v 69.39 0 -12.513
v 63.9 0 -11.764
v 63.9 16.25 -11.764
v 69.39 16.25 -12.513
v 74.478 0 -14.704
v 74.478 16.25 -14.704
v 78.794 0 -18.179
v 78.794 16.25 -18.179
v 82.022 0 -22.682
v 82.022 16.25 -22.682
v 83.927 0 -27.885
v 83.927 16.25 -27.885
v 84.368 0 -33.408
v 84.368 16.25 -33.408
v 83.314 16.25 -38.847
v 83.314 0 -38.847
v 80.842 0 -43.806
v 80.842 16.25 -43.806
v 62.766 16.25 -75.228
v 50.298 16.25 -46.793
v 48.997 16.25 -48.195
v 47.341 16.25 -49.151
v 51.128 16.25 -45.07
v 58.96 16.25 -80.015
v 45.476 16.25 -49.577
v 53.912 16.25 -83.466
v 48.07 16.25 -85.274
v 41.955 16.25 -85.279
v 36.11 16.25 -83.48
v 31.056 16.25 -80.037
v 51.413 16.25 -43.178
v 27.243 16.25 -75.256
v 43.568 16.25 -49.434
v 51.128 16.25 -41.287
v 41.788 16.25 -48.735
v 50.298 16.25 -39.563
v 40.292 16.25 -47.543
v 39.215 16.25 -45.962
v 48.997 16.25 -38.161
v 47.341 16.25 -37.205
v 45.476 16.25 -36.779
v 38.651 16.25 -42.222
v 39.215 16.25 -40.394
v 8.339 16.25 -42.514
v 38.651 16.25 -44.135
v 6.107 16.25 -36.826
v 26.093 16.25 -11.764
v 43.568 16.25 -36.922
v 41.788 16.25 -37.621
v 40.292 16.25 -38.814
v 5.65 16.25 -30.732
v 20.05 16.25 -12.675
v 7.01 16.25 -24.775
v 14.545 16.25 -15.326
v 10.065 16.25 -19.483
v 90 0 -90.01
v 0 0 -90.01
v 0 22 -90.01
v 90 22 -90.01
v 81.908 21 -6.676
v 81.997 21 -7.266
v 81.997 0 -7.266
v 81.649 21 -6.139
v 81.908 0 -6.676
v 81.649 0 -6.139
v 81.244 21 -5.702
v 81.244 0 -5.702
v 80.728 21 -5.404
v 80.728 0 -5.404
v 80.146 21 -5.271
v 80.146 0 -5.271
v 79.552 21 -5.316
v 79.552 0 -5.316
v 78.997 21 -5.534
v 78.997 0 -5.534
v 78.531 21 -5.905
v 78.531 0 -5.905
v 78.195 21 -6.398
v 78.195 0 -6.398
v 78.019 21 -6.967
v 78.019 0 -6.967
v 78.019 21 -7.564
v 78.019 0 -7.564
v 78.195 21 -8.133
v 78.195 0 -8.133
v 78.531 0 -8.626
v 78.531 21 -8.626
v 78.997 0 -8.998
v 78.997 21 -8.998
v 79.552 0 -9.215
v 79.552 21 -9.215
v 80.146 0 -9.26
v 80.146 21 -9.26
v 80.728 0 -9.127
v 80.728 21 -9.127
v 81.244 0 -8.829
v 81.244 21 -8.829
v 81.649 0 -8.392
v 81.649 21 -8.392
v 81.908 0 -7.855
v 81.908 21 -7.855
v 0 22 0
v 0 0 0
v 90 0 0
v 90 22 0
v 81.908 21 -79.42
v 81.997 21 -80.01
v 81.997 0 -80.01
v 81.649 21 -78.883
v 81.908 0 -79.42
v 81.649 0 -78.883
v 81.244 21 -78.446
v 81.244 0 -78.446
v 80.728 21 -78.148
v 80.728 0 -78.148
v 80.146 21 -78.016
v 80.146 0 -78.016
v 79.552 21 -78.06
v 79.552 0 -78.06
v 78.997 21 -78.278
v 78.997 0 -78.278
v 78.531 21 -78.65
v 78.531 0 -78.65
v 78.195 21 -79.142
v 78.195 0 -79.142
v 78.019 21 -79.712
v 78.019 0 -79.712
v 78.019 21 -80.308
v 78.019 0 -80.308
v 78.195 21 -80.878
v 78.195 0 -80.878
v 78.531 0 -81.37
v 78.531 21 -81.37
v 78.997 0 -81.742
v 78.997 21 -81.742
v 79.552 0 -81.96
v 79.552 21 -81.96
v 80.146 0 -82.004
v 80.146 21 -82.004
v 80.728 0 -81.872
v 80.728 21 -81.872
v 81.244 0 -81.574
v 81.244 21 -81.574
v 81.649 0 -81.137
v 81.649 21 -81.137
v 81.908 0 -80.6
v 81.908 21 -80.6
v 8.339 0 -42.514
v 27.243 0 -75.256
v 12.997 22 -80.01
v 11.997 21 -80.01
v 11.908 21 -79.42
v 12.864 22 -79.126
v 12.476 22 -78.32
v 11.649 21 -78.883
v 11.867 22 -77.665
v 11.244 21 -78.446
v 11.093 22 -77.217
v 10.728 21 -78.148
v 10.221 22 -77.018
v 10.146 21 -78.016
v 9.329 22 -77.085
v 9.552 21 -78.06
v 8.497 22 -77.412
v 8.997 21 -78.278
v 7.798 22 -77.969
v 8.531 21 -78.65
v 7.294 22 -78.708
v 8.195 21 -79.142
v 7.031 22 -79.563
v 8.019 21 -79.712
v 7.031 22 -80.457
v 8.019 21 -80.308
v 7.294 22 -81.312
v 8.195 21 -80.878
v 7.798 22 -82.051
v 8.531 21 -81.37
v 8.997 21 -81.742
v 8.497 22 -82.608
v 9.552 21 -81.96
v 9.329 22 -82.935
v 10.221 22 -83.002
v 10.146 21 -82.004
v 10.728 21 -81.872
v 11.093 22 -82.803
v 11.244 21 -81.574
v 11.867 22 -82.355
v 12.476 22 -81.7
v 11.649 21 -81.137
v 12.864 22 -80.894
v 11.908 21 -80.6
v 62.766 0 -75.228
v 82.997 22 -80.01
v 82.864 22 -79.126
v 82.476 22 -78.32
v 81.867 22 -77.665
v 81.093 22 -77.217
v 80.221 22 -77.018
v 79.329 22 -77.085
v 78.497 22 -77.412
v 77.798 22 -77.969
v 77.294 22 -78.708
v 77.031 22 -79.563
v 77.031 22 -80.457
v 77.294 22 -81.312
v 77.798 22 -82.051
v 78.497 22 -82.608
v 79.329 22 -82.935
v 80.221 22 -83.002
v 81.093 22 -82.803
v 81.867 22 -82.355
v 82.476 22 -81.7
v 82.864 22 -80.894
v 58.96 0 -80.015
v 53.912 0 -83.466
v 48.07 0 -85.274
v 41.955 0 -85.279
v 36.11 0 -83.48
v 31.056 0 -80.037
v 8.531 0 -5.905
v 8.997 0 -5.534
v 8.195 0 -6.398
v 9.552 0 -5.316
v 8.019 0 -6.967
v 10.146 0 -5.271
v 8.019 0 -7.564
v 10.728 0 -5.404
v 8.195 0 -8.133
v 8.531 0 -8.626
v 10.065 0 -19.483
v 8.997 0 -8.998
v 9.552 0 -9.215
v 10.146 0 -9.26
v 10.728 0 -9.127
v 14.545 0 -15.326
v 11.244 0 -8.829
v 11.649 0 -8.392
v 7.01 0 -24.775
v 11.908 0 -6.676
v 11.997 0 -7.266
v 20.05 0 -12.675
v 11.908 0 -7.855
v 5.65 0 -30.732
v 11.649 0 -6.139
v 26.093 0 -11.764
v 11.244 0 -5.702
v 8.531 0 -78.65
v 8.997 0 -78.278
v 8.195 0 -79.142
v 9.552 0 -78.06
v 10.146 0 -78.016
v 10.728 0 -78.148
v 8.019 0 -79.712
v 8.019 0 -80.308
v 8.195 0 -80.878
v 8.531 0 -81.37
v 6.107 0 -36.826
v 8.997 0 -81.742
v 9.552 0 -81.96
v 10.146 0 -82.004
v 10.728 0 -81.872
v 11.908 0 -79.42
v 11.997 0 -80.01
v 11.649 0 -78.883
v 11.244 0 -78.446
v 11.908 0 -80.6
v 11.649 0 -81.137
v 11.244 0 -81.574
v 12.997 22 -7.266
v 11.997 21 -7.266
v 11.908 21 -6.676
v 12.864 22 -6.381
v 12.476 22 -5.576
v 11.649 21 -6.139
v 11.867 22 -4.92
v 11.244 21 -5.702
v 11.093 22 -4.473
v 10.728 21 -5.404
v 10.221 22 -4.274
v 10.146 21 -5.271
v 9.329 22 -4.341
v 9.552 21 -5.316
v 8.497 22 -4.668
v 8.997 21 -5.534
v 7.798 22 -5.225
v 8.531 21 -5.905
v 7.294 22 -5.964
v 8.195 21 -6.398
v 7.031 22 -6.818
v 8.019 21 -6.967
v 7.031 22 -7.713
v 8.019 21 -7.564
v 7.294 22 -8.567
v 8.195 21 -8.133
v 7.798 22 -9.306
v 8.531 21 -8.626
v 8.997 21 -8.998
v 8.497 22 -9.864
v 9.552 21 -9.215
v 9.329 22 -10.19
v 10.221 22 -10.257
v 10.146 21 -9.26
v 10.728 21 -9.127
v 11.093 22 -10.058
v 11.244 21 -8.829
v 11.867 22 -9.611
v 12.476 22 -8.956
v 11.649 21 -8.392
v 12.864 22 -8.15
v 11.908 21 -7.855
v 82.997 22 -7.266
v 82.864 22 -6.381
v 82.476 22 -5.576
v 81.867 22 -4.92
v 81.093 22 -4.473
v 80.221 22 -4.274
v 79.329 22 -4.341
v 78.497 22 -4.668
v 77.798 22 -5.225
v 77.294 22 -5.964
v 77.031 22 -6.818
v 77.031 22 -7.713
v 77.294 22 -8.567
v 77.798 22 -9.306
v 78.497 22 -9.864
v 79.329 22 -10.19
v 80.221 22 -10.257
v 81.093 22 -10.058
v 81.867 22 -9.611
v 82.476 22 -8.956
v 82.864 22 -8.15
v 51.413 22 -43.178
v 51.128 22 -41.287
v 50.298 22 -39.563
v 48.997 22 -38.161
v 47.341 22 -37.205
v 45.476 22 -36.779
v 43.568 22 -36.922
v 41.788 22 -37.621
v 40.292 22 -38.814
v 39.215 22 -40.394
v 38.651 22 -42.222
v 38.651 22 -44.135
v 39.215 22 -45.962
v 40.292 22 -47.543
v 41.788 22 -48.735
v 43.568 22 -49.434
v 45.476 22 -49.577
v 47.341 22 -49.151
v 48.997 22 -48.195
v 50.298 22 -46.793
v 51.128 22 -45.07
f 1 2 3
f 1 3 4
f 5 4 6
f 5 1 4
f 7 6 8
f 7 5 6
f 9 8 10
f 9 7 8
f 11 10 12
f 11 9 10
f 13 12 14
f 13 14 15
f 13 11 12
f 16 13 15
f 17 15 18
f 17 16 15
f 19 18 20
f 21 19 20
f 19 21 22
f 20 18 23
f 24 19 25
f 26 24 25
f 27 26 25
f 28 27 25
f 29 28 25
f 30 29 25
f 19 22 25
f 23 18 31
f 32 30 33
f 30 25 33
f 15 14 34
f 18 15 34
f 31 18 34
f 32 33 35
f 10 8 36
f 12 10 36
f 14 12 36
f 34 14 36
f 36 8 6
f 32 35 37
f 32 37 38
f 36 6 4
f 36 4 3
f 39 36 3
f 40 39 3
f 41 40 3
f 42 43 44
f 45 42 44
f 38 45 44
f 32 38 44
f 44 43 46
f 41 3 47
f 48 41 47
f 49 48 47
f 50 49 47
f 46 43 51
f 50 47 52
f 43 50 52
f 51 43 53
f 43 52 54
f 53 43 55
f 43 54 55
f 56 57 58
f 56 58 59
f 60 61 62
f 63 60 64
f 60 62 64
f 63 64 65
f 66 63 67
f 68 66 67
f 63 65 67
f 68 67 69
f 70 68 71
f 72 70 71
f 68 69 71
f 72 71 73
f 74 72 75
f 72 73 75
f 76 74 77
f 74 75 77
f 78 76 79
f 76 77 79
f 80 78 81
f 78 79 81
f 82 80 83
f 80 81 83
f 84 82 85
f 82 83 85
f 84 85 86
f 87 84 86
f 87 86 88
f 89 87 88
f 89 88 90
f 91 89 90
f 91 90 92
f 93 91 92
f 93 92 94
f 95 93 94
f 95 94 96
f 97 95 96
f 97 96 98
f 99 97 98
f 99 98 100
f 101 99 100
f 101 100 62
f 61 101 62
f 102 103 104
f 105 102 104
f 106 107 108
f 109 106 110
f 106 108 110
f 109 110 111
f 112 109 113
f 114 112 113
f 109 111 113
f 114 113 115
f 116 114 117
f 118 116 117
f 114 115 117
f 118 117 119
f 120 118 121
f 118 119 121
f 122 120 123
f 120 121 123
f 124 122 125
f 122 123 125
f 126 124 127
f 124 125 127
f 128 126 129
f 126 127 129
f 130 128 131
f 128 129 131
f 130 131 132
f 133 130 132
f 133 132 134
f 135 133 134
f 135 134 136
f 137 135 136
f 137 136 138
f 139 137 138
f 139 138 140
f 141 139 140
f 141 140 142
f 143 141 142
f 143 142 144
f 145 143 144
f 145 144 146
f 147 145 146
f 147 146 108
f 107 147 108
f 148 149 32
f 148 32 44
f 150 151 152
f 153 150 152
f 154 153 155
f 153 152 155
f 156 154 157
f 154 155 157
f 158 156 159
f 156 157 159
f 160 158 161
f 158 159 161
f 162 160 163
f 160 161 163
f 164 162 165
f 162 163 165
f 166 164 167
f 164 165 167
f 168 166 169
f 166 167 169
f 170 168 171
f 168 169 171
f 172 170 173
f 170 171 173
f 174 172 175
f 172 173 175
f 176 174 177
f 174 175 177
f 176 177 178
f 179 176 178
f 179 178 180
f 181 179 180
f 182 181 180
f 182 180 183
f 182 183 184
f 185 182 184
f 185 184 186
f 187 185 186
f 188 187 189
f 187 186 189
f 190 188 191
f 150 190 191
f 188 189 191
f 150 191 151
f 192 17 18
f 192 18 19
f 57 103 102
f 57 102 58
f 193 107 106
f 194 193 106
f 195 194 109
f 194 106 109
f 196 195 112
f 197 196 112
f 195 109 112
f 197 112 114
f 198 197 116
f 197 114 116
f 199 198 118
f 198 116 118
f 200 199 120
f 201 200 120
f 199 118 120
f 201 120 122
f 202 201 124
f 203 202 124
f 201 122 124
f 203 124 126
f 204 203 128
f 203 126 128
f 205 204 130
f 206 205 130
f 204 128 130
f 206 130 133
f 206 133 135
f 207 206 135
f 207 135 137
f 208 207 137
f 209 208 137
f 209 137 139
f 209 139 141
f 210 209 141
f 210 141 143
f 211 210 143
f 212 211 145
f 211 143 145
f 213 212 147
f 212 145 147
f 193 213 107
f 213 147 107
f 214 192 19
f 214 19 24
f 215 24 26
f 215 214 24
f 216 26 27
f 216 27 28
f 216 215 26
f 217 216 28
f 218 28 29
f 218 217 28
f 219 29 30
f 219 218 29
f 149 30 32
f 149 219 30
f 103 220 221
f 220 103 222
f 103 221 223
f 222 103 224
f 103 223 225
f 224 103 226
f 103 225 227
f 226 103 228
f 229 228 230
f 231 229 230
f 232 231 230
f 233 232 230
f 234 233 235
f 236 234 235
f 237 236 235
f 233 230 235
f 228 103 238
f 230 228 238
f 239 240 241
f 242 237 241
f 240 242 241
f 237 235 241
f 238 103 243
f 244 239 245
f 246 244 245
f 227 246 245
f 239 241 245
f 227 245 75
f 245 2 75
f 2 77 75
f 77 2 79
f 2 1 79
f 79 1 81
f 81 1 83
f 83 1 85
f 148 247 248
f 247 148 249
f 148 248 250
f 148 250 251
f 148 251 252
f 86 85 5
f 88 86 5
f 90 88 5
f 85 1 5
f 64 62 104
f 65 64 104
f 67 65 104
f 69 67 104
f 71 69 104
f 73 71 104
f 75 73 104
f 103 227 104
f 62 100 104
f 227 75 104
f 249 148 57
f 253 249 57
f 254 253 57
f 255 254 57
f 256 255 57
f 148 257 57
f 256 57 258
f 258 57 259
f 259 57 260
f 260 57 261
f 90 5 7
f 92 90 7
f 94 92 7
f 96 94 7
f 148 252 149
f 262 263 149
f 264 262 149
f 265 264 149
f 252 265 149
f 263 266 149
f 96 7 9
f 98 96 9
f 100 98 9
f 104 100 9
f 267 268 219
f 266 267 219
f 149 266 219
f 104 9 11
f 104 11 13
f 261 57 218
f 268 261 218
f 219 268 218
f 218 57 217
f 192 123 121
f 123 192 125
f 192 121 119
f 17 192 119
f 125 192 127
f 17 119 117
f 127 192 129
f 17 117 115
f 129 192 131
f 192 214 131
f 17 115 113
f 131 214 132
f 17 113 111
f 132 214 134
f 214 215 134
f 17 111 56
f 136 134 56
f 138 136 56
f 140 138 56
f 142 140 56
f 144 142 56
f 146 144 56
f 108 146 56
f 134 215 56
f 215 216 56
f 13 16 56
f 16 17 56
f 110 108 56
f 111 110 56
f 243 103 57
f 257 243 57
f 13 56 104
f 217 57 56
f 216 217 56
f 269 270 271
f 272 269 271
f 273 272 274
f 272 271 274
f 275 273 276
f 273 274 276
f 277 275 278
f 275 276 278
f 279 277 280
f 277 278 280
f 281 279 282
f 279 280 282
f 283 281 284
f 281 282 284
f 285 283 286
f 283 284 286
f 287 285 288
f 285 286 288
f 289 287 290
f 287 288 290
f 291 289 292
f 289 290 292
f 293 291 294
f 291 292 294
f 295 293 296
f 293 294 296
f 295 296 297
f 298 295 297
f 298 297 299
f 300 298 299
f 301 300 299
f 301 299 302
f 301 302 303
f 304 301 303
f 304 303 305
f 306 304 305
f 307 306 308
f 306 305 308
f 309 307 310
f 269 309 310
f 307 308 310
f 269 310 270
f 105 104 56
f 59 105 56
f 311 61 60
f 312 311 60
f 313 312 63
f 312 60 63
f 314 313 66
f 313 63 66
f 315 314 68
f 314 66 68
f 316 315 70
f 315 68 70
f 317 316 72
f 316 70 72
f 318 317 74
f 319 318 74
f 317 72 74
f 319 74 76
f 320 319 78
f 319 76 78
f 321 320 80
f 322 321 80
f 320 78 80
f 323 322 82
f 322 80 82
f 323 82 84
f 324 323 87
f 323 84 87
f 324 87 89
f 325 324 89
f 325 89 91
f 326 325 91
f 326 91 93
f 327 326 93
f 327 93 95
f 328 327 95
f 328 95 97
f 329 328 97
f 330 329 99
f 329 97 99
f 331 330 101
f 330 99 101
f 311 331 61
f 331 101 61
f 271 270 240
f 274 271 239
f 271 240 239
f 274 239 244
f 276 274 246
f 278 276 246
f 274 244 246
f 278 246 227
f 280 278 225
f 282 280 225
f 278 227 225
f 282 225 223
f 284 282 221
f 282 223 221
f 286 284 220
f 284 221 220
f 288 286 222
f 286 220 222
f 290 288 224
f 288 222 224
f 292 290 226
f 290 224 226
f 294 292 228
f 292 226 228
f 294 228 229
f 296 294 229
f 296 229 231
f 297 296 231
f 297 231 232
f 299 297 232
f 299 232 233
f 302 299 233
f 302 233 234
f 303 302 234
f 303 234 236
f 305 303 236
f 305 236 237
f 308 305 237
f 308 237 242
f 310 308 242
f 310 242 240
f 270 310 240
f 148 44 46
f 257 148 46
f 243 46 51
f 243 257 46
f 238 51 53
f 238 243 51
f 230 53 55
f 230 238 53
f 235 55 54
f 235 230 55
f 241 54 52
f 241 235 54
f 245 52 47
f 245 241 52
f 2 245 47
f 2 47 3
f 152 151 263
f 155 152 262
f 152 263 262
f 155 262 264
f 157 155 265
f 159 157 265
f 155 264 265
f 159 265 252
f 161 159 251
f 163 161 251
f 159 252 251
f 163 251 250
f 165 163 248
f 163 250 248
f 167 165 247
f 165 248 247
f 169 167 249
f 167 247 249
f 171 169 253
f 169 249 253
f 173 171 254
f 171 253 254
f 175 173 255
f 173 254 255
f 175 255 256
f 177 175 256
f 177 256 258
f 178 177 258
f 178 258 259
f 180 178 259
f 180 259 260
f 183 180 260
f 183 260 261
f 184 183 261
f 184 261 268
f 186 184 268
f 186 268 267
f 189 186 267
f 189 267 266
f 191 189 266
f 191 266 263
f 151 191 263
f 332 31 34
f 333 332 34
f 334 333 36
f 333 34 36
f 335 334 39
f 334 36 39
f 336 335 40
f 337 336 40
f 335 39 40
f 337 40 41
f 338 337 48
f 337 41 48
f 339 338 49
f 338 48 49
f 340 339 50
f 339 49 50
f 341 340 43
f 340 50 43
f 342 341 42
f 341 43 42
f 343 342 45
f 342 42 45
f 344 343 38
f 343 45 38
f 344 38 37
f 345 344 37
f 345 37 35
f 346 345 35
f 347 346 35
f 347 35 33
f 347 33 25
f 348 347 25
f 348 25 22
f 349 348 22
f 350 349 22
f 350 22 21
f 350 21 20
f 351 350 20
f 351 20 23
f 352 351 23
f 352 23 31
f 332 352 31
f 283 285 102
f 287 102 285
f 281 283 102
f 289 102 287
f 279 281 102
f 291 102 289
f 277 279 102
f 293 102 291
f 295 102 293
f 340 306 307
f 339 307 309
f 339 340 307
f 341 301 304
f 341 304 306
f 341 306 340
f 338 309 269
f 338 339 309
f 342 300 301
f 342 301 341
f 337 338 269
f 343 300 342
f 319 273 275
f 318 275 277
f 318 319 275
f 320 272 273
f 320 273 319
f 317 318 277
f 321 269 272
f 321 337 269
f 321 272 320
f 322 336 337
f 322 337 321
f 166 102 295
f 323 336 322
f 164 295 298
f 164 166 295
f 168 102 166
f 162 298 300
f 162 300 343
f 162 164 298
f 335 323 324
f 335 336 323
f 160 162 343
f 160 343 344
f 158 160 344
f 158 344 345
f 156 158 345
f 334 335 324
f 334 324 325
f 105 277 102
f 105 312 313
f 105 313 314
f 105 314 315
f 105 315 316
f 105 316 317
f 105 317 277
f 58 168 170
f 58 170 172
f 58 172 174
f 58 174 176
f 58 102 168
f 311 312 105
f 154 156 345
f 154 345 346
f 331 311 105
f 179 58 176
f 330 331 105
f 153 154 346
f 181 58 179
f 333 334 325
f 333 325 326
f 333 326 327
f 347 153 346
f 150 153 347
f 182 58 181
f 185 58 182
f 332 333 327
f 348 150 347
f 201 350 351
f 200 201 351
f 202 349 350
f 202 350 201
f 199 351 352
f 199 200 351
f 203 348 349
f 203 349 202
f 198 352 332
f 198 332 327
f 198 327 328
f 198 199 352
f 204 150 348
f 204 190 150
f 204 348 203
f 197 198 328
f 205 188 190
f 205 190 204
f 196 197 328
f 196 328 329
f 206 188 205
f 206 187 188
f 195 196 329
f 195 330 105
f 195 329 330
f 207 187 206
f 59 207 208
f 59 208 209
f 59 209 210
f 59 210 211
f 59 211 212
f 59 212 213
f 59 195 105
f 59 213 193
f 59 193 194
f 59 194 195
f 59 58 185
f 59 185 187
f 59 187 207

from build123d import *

# Parameters (mm, degrees)
SKETCH1_W               = 90
SKETCH1_H               = 90.01
BOSS_EXTRUDE1_DEPTH     = 22
SKETCH2_R               = 2
CUT_EXTRUDE1_DEPTH      = 1
CUT_EXTRUDE1_DEPTH_BACK = 23
CUT_EXTRUDE2_DEPTH      = 16.25
SKETCH4_R               = 6.416854585
CUT_EXTRUDE3_DEPTH      = 6.75
CHAMFER1_SIZE           = 1


with BuildPart() as part:
    # Sketch1 → Boss-Extrude1 (new body)
    with BuildSketch(Plane(origin=(0, 0, 0), x_dir=(1, 0, 0), z_dir=(0, 1, 0))):
        with Locations((45, 45.005)):
            Rectangle(SKETCH1_W, SKETCH1_H)
    extrude(amount=BOSS_EXTRUDE1_DEPTH)

    # Sketch2 → Cut-Extrude1 (cut, two sides)
    with BuildSketch(Plane.XZ) as cut_extrude1_sk:
        with Locations((9.997, -7.265579483)):
            Circle(SKETCH2_R)
        with Locations((9.997, -80.01)):
            Circle(SKETCH2_R)
        with Locations((79.997, -7.265579483)):
            Circle(SKETCH2_R)
        with Locations((79.997, -80.01)):
            Circle(SKETCH2_R)
    extrude(amount=CUT_EXTRUDE1_DEPTH, mode=Mode.SUBTRACT)
    extrude(cut_extrude1_sk.sketch, amount=-CUT_EXTRUDE1_DEPTH_BACK, mode=Mode.SUBTRACT)

    # Sketch3 → Cut-Extrude2 (cut)
    with BuildSketch(Plane.XZ):
        with BuildLine():
            Line((26.092808525, -11.764178956), (63.899808525, -11.764178956))
            ThreePointArc((63.899808525, -11.764178956), (82.022370223, -22.681759768), (80.842050765, -43.805861151))
            Line((80.842050765, -43.805861151), (62.765845791, -75.228209836))
            ThreePointArc((62.765845791, -75.228209836), (45.012346751, -85.505995123), (27.242787748, -75.256001397))
            Line((27.242787748, -75.256001397), (8.339287748, -42.514178956))
            ThreePointArc((8.339287748, -42.514178956), (8.339287748, -22.014178956), (26.092808525, -11.764178956))
        make_face()
    extrude(amount=-CUT_EXTRUDE2_DEPTH, mode=Mode.SUBTRACT)

    # Sketch4 → Cut-Extrude3 (cut, through all)
    with BuildSketch(Plane.XZ.offset(-16.25)):
        with Locations((44.996308525, -43.17811977)):
            Circle(SKETCH4_R)
    extrude(amount=-CUT_EXTRUDE3_DEPTH, mode=Mode.SUBTRACT)

    # Chamfer1
    chamfer1_edges = [part.edges().sort_by_distance(p)[0] for p in [
        (7.997, 22, -7.265579483),
        (7.997, 22, -80.01),
        (77.997, 22, -7.265579483),
        (77.997, 22, -80.01),
    ]]
    chamfer(chamfer1_edges, length=CHAMFER1_SIZE)


solid = part.part
